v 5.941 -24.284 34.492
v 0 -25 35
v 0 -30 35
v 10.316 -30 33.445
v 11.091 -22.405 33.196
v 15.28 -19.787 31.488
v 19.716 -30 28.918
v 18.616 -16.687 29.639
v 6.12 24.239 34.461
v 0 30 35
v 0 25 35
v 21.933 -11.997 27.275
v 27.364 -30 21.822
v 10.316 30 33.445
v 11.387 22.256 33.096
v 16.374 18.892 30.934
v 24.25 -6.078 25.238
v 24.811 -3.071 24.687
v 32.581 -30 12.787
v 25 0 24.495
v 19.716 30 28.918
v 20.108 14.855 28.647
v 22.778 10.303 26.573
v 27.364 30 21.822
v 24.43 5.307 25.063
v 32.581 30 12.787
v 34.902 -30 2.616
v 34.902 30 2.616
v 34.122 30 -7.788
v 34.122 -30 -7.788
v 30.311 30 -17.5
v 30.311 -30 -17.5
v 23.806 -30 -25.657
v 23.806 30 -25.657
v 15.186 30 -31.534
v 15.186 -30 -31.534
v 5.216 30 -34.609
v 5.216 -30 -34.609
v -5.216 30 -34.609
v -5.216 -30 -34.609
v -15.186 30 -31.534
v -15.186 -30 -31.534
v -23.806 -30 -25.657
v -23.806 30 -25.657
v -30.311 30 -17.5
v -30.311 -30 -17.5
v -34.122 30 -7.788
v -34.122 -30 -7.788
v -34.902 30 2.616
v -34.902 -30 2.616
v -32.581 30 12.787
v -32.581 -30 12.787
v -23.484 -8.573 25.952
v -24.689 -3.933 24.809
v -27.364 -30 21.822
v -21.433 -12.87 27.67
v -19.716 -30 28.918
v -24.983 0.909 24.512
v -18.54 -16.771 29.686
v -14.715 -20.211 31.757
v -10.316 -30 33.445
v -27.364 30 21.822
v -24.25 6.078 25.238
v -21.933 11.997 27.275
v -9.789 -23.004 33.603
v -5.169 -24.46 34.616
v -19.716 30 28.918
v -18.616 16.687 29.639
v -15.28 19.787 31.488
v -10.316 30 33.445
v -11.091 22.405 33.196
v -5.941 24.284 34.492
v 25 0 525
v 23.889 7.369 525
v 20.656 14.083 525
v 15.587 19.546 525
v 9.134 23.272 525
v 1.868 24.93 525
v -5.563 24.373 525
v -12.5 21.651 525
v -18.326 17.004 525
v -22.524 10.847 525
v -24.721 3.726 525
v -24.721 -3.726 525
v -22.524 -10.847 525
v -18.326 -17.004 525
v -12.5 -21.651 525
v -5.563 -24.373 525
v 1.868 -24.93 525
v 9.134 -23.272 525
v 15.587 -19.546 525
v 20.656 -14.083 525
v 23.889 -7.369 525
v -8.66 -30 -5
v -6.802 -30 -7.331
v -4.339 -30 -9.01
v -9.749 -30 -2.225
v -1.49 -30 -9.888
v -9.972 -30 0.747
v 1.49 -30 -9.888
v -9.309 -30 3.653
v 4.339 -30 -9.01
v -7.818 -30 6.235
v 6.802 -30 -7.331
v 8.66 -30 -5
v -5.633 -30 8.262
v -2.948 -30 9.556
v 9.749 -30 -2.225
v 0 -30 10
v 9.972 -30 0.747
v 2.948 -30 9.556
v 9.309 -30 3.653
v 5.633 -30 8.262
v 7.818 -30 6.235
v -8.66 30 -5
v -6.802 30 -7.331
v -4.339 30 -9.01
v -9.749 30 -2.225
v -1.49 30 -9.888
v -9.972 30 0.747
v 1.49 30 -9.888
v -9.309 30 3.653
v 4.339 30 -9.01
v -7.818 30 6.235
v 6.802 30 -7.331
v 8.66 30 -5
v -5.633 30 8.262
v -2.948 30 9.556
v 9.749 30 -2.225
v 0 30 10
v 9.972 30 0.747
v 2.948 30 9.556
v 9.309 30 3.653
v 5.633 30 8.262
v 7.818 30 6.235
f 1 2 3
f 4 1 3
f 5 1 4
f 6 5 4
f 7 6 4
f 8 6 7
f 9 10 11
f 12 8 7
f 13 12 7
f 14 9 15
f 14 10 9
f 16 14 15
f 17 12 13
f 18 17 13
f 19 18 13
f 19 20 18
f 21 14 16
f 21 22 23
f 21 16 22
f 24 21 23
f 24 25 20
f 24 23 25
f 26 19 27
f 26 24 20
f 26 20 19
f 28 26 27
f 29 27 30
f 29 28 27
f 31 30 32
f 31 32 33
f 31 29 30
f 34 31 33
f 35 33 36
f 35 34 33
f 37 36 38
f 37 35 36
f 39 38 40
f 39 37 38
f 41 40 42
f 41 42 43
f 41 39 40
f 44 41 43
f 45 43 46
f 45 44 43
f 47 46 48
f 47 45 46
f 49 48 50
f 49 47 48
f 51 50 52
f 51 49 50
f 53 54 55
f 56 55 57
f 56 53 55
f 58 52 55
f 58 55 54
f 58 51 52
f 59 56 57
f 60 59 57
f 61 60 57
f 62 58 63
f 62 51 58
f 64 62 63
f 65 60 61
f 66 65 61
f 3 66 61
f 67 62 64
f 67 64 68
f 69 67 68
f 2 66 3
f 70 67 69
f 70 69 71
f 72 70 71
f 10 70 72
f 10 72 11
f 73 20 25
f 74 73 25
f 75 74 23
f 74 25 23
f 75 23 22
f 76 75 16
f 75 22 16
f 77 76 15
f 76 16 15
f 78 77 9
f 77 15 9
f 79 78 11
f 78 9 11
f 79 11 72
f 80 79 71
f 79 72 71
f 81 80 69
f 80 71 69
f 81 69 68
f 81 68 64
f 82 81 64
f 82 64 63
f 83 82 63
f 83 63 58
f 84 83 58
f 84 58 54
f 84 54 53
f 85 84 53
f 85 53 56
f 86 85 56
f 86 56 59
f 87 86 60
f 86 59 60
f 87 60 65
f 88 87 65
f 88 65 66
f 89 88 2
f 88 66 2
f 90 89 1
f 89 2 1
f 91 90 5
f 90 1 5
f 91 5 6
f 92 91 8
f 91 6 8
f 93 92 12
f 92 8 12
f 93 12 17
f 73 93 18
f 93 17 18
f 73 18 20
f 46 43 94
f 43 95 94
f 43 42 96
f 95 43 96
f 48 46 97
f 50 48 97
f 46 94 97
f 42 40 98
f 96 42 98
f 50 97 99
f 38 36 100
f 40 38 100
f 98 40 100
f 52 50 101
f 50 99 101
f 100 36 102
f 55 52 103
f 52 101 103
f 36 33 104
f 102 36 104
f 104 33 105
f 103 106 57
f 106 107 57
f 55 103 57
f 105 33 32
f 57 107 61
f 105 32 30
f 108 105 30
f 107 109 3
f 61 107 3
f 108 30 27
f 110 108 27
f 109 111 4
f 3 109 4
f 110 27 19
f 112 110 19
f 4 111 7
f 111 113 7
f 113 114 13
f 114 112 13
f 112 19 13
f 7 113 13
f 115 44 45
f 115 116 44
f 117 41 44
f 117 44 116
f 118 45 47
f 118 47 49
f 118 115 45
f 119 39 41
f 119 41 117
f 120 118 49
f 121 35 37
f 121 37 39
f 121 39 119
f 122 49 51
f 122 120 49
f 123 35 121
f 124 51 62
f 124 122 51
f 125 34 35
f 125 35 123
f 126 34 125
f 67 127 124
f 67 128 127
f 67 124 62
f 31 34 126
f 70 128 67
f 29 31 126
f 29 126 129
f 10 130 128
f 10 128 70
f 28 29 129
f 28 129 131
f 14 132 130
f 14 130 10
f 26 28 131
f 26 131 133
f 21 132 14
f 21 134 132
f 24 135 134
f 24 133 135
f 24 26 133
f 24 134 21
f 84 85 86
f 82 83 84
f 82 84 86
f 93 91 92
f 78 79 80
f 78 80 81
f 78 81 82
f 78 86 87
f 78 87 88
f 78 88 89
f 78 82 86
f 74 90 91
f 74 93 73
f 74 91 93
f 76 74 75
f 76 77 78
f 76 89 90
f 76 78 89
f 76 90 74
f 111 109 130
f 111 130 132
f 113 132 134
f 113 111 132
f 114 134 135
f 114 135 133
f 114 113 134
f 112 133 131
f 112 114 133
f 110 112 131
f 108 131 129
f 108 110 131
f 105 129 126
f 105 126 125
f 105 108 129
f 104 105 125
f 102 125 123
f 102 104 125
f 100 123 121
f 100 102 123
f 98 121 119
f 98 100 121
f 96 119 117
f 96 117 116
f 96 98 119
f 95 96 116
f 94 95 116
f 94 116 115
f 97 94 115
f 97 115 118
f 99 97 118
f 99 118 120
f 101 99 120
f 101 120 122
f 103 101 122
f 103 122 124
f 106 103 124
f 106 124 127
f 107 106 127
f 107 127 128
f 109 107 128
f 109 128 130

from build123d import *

# Parameters (mm, degrees)
SKETCH1_R               = 25
BOSS_EXTRUDE1_DEPTH     = 525
SKETCH2_R               = 35
SKETCH2_R_2             = 10
BOSS_EXTRUDE2_DEPTH     = 30
CUT_EXTRUDE1_DEPTH      = 528.019923834
CUT_EXTRUDE1_DEPTH_BACK = 528.019923834
SKETCH2_2_R             = 10


with BuildPart() as part:
    # Sketch1 → Boss-Extrude1 (new body)
    with BuildSketch(Plane.XY):
        Circle(SKETCH1_R)
    extrude(amount=BOSS_EXTRUDE1_DEPTH)

    # Sketch2 → Boss-Extrude2 (add, symmetric)
    with BuildSketch(Plane(origin=(0, 0, 0), x_dir=(1, 0, 0), z_dir=(0, 1, 0))):
        Circle(SKETCH2_R)
        Circle(SKETCH2_R_2, mode=Mode.SUBTRACT)
    extrude(amount=BOSS_EXTRUDE2_DEPTH, both=True)

    # Sketch2<2> → Cut-Extrude1 (cut, two sides: drawn at the far end of the back side and taken through both)
    with BuildSketch(Plane(origin=(0, 0, 0), x_dir=(1, 0, 0), z_dir=(0, 1, 0)).offset(-CUT_EXTRUDE1_DEPTH_BACK)):
        Circle(SKETCH2_2_R)
    extrude(amount=CUT_EXTRUDE1_DEPTH + CUT_EXTRUDE1_DEPTH_BACK, mode=Mode.SUBTRACT)


solid = part.part
